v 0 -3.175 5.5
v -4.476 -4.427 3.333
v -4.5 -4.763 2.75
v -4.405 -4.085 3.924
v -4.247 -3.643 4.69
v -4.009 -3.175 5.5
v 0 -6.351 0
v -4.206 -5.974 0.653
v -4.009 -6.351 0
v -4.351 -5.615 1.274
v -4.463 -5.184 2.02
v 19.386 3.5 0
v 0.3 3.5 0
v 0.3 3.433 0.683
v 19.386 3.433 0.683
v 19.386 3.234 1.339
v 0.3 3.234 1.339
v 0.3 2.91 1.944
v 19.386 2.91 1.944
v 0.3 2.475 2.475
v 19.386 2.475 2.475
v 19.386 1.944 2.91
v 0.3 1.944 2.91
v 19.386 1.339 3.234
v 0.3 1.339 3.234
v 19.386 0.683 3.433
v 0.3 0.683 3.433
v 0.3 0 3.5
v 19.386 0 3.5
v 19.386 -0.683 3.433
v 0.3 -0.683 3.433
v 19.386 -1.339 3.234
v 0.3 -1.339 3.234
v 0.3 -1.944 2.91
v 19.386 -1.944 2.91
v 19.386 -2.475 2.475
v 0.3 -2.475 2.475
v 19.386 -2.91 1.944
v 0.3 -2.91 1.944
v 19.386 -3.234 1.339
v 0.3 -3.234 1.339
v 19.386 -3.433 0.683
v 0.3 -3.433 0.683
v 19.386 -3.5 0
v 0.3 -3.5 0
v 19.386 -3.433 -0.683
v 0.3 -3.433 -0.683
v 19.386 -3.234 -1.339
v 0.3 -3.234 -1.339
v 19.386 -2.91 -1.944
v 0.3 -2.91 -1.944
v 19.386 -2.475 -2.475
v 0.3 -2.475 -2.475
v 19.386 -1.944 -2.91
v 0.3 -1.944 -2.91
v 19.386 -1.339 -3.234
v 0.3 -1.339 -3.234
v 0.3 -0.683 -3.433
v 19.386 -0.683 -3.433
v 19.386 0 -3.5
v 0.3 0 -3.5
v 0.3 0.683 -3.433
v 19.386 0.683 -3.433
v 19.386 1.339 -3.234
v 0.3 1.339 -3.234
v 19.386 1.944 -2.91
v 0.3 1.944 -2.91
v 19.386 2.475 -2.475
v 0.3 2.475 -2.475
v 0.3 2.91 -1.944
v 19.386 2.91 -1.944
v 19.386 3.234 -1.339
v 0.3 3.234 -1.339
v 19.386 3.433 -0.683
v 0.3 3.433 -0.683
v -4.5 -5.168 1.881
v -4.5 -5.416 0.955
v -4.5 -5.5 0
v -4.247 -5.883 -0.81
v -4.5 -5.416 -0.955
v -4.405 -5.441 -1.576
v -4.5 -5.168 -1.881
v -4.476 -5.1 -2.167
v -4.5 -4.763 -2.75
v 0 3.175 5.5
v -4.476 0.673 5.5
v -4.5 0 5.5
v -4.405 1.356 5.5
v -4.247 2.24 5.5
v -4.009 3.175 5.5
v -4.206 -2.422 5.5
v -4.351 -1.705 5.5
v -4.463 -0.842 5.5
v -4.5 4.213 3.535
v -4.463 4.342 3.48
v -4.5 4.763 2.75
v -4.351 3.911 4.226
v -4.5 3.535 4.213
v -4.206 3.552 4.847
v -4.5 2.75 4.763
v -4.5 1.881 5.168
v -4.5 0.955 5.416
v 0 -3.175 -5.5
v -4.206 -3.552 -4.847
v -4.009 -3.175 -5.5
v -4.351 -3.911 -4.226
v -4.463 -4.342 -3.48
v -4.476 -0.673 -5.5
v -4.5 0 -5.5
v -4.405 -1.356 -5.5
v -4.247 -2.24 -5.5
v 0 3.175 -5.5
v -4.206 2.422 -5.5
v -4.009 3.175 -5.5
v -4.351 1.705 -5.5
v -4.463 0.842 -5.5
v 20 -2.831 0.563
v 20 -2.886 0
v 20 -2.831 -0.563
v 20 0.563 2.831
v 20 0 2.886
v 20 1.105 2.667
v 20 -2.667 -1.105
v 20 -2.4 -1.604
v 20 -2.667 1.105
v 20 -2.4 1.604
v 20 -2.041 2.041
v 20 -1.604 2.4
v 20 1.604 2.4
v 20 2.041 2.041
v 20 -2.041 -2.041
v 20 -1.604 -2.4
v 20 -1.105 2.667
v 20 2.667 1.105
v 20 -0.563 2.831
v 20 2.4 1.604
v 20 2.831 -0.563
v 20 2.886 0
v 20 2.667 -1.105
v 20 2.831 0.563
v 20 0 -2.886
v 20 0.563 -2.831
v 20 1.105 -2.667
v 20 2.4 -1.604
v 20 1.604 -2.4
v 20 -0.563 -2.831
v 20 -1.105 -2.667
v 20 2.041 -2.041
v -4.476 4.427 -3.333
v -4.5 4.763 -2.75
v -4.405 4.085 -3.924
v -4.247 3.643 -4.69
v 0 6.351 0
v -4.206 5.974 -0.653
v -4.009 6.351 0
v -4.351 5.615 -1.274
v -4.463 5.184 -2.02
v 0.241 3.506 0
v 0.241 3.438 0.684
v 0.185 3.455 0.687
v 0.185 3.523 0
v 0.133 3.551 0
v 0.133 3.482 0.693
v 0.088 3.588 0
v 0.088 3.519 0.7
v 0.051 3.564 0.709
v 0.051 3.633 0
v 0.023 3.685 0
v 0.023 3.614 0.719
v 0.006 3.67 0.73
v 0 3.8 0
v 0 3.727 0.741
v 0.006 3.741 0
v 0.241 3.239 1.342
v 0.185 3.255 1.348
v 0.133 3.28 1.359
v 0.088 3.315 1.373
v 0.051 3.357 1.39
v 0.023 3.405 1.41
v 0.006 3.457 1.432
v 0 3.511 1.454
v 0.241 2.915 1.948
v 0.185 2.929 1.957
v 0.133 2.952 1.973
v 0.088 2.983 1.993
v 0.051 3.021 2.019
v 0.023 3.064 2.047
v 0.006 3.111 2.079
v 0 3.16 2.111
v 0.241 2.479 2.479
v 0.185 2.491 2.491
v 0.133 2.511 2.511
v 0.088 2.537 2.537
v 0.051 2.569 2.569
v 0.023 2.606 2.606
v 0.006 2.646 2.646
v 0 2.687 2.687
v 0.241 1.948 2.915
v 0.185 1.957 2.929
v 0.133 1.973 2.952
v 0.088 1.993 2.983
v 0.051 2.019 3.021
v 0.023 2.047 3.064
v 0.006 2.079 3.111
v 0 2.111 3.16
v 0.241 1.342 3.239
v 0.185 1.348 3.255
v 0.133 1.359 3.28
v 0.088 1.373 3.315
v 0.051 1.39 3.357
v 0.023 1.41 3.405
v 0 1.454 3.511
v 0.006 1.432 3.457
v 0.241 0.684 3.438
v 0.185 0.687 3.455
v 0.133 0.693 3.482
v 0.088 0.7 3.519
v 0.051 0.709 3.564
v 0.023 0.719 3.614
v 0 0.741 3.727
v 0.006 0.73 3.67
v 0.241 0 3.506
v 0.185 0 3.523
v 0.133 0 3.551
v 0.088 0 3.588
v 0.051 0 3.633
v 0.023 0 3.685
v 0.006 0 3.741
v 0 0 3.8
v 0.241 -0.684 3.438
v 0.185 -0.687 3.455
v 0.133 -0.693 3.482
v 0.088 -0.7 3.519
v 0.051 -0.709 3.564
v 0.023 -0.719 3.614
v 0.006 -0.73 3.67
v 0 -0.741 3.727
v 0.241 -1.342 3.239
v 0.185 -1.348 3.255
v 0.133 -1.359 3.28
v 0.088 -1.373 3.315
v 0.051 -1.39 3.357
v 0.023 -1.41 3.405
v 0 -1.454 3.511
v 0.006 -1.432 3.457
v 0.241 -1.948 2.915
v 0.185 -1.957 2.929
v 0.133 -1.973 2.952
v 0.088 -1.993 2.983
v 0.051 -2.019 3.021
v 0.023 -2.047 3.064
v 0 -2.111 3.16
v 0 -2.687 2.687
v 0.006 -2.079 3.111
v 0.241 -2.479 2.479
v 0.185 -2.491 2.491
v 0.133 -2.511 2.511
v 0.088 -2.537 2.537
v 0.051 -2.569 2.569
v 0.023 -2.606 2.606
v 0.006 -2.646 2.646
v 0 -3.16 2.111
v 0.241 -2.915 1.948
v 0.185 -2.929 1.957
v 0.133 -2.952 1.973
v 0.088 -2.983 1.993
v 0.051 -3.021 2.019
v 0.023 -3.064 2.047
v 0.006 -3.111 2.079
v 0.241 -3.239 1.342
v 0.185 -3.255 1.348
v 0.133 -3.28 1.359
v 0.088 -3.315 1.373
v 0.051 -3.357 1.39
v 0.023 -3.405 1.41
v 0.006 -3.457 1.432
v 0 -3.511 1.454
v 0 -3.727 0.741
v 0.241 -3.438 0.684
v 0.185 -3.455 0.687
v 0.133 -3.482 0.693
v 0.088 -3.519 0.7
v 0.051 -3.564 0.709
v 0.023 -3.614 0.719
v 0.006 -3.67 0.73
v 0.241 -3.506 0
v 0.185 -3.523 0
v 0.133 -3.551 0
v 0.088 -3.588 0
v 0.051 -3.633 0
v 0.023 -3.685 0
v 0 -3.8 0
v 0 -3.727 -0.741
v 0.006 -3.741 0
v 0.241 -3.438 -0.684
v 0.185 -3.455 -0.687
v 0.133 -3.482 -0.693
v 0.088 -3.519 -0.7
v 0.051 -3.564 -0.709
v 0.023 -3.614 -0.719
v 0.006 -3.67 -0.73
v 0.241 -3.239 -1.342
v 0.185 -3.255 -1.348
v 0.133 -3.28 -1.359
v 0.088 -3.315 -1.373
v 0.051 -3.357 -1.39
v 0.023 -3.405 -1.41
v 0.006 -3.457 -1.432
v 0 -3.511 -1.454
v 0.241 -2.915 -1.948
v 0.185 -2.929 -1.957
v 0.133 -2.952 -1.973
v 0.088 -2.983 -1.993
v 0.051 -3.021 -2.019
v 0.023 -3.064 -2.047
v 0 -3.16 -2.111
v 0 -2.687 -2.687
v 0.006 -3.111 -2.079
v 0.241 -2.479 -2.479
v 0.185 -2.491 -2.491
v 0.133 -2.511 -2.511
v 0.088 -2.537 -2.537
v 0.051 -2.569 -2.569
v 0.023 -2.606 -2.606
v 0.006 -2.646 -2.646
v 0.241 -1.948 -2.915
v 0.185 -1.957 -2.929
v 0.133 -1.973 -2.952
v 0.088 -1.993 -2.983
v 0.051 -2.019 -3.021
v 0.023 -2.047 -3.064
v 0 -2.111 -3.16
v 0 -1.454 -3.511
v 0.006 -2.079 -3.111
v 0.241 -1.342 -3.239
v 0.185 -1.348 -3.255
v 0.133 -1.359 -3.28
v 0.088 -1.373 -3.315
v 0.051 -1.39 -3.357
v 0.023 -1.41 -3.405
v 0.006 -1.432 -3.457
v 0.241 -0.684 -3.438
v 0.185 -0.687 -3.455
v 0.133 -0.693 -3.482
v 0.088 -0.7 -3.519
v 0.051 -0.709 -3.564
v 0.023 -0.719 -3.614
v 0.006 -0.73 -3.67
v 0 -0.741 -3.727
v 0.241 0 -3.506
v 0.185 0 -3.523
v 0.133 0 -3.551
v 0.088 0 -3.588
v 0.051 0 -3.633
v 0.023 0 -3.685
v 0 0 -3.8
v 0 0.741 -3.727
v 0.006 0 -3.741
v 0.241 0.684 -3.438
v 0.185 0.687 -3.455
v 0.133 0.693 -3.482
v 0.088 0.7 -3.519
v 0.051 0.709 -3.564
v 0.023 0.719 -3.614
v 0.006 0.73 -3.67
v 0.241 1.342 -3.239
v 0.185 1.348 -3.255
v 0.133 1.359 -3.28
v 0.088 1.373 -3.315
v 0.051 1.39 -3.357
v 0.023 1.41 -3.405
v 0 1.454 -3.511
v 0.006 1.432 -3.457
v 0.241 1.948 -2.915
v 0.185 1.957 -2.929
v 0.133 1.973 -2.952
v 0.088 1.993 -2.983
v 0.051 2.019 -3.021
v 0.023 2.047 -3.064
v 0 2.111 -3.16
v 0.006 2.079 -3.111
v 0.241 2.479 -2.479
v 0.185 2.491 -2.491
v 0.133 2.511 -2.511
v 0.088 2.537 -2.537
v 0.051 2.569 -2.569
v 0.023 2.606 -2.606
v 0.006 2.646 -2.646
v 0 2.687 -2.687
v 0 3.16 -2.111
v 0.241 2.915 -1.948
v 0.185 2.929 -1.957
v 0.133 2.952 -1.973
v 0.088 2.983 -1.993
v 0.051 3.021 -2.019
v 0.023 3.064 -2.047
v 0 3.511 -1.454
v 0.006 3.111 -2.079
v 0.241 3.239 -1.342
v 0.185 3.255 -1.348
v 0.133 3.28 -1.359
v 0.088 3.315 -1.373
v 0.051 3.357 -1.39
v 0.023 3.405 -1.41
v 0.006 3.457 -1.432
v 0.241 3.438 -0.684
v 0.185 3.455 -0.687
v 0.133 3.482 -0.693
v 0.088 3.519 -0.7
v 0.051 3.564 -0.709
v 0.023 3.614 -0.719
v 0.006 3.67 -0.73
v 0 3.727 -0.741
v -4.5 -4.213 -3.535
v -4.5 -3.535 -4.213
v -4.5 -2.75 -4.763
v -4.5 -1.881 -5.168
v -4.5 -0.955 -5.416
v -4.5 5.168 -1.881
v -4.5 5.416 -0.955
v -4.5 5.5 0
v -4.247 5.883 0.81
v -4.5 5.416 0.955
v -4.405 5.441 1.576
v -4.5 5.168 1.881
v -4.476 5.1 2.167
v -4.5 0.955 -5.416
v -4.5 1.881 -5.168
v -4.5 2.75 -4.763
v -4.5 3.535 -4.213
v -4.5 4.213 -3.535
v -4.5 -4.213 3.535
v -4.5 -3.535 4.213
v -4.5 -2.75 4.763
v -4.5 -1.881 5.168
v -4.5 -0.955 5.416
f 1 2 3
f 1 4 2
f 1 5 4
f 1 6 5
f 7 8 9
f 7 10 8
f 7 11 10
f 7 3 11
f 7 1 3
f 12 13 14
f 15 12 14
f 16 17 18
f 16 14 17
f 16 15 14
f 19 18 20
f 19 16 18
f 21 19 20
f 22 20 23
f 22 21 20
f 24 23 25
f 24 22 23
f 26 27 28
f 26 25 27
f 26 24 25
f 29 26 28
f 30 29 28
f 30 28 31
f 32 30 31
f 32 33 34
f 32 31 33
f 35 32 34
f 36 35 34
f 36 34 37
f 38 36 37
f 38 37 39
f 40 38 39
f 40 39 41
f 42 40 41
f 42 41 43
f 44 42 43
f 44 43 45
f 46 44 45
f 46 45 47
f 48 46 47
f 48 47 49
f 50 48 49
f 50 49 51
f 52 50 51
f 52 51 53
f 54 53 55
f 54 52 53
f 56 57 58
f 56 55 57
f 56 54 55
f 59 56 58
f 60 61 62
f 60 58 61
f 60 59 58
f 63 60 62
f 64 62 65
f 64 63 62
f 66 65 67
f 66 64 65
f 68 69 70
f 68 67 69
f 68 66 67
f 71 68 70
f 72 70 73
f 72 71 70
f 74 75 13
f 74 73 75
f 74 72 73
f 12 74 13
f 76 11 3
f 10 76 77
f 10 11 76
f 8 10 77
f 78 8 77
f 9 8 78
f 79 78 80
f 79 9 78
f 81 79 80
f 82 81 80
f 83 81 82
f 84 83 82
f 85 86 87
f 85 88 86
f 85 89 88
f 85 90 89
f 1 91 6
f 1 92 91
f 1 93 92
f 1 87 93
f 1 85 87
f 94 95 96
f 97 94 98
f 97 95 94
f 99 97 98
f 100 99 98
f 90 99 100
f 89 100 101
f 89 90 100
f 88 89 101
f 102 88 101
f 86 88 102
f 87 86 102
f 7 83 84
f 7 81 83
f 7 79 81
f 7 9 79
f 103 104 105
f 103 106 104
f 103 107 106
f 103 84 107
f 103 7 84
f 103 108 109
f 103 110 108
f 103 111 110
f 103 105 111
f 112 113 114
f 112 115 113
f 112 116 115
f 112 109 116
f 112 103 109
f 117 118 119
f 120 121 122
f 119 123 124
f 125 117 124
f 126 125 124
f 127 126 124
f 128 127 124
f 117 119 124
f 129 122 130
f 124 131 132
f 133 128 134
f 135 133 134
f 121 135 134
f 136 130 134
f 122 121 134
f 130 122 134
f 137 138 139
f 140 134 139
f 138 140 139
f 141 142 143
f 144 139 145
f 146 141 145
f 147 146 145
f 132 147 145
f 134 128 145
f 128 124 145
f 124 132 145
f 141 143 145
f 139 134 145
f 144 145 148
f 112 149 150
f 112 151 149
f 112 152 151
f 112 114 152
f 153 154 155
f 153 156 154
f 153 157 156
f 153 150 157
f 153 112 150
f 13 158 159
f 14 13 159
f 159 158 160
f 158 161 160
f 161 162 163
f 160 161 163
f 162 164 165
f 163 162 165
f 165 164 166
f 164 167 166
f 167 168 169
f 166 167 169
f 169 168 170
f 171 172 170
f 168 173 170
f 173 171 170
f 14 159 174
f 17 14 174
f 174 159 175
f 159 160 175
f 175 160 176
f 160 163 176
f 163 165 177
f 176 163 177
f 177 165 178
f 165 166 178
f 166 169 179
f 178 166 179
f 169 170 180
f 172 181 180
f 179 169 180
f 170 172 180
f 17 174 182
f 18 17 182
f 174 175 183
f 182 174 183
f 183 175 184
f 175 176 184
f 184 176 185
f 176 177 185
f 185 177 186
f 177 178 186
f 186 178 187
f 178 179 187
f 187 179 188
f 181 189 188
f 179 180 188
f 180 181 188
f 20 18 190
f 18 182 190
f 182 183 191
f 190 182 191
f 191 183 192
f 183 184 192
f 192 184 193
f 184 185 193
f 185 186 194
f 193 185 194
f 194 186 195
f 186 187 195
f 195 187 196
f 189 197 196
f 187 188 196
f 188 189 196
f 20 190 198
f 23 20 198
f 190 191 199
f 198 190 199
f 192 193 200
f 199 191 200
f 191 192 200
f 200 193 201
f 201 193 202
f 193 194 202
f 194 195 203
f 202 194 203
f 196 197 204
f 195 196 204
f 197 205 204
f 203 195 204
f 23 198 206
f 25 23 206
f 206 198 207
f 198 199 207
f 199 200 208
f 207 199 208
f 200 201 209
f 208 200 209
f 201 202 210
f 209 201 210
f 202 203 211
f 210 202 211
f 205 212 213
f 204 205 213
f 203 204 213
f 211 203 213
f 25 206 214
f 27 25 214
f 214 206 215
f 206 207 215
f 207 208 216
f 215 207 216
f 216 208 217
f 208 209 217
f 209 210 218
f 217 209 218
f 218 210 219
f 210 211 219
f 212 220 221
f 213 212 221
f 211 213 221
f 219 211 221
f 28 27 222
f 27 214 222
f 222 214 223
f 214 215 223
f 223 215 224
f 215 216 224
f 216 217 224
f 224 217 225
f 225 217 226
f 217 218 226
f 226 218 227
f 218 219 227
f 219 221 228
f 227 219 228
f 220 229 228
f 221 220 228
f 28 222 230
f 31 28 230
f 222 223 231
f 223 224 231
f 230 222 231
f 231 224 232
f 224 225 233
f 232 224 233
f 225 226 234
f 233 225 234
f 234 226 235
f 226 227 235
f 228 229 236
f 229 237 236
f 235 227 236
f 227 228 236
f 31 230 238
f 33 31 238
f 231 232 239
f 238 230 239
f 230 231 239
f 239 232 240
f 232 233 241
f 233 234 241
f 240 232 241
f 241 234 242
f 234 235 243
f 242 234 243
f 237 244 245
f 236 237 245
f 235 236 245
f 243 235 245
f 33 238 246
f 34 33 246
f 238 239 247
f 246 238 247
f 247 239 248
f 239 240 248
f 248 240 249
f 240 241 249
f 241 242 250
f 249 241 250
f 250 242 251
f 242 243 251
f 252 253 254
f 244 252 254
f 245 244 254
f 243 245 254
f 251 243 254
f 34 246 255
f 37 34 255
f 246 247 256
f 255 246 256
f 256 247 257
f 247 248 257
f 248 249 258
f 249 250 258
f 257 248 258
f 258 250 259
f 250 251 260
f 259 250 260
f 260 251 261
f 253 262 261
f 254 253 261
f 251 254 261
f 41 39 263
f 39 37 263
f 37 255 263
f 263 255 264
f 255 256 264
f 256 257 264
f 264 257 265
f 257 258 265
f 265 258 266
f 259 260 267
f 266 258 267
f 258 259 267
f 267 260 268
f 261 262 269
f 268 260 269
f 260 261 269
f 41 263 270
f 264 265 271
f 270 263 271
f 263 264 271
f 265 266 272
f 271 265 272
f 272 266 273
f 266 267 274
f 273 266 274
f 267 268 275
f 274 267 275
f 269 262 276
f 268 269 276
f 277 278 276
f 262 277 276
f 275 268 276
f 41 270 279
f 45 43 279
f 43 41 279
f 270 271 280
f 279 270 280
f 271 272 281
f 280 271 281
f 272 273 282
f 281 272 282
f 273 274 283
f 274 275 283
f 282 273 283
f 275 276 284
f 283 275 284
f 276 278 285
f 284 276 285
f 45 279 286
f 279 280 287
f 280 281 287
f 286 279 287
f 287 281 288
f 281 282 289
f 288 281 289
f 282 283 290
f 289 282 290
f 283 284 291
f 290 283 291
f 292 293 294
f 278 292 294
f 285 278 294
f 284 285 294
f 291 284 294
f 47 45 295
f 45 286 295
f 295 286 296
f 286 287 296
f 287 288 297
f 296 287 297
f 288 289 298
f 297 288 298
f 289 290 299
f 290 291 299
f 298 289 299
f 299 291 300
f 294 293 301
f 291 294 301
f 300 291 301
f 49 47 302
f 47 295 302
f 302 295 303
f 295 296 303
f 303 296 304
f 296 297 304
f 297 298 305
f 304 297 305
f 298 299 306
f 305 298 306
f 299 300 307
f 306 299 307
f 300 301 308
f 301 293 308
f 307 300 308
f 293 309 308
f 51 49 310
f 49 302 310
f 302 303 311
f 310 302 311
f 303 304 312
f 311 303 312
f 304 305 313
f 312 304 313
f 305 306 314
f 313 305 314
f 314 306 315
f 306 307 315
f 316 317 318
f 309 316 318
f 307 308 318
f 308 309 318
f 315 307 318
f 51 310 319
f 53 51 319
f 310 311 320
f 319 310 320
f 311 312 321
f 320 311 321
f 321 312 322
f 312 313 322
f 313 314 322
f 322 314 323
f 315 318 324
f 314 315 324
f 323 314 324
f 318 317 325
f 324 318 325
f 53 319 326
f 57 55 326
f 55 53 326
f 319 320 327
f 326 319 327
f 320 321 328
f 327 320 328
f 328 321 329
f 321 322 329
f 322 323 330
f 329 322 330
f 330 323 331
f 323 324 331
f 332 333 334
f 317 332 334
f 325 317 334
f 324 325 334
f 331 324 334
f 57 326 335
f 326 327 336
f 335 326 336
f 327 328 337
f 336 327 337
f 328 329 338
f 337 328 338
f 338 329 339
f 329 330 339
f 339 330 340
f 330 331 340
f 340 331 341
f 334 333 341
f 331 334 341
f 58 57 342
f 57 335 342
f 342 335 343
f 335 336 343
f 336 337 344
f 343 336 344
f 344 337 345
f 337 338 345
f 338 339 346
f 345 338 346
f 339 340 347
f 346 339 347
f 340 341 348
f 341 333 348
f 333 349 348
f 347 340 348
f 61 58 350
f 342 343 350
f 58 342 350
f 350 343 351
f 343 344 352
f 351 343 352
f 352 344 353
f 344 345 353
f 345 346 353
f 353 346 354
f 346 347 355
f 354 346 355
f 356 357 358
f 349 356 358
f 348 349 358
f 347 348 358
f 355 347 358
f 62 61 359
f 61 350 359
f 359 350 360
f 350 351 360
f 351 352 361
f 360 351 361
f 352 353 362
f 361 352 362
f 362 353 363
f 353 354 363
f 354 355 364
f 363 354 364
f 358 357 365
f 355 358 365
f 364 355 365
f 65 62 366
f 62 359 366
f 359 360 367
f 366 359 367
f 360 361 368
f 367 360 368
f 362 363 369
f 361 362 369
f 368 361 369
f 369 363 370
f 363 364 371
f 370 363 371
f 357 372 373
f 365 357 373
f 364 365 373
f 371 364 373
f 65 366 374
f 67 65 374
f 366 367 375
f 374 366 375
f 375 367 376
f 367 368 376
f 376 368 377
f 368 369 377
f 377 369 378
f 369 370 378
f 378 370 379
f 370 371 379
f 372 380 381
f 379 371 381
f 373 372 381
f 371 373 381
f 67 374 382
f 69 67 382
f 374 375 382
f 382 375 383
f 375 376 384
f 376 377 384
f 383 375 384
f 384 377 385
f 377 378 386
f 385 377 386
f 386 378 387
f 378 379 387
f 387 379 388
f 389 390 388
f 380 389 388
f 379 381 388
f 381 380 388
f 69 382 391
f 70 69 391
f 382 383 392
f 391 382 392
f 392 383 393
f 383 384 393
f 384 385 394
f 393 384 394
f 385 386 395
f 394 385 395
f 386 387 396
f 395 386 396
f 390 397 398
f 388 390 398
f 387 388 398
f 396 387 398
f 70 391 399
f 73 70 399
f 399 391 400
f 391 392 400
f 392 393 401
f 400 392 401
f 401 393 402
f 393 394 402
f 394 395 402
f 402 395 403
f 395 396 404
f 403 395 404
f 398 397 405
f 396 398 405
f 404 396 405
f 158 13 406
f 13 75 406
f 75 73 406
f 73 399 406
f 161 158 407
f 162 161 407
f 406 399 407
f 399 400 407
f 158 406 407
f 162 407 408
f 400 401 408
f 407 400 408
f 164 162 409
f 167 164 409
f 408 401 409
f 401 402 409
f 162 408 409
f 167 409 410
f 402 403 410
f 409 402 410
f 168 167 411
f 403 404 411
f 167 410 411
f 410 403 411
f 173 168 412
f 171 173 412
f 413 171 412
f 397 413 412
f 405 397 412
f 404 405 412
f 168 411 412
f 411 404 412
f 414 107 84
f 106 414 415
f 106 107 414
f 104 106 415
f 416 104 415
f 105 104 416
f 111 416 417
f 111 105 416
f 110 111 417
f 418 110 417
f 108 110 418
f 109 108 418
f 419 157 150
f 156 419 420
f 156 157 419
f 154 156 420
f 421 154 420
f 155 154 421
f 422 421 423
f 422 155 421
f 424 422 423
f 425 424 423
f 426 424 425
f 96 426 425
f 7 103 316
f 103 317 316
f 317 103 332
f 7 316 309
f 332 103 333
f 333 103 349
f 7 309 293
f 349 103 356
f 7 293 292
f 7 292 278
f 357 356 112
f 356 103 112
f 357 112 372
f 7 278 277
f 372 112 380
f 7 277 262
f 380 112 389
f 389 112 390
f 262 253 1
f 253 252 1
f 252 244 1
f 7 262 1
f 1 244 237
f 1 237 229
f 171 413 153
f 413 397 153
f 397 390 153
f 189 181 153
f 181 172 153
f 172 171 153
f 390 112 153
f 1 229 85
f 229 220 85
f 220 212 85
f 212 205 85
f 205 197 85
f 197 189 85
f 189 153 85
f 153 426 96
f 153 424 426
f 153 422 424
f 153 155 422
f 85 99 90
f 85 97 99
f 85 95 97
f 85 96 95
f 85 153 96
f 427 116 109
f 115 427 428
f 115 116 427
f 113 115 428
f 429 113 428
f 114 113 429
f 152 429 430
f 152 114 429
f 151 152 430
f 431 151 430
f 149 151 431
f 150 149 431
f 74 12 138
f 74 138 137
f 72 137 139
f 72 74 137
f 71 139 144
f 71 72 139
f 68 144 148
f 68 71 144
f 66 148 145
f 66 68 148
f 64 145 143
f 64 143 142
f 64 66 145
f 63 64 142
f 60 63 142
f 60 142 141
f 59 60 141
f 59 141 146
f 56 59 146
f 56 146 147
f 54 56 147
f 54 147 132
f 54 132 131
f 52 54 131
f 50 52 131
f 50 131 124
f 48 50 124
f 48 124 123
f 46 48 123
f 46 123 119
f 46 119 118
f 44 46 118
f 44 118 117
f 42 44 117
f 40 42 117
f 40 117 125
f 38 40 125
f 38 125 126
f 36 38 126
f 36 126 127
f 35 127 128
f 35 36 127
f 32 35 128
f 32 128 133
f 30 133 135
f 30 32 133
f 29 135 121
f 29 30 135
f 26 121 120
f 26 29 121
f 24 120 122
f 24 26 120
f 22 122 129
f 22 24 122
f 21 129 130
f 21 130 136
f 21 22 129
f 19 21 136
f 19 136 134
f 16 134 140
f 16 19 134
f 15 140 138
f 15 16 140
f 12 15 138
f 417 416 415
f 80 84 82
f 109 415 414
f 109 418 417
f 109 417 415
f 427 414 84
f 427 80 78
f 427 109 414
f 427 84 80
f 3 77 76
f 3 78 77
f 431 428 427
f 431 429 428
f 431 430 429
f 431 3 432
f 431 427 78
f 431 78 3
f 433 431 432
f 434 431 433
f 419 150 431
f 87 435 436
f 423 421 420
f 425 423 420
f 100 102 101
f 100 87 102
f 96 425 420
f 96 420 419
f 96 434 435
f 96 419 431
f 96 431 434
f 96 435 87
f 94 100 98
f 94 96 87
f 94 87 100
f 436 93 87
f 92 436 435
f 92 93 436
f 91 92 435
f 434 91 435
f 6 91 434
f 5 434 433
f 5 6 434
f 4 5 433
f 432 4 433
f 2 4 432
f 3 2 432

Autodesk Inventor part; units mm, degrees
ref_plane "YZ Plane" through (0, 0, 0) normal (1, 0, 0) x (0, 1, 0)
ref_plane "XZ Plane" through (0, 0, 0) normal (0, 1, 0) x (-1, 0, 0)
sketch "Sketch1" plane through (0, 0, 0) normal (0, 0, 1) x (1, 0, 0)
  line L0 (0, 3.5) -> (20, 3.5)
  line L1 (20, 3.5) -> (20, 0)
  line L2 (20, 0) -> (0, 0)
  line L3 (-4, 0) -> (24, 0) projected
  line L4 (0, -0.7) -> (0, 4.2) projected
  line L5 (0, 3.5) -> (0, 0)
  dimension "d2" = 7
  dimension "d59" = 20
revolve "Body" add sketch "Sketch1" angle 360 about axis through (20, 0, 0) along (-1, 0, 0)
sketch "Sketch2" plane through (0, 0, 0) normal (-1, 0, 0) x (0, 0, 1)
  line L0 (0, 6.3509) -> (5.5, 3.1754)
  line L1 (5.5, 3.1754) -> (5.5, -3.1754)
  line L2 (5.5, -3.1754) -> (0, -6.3509)
  line L3 (0, -6.3509) -> (-5.5, -3.1754)
  line L4 (-5.5, -3.1754) -> (-5.5, 3.1754)
  line L5 (-5.5, 3.1754) -> (0, 6.3509)
  line L6 (-7.7, 0) -> (7.7, 0) projected
  line L7 (0, 8.8912) -> (0, -8.8912) projected
  point P0 (0, 0)
  point P1 (0, 0)
  dimension "d11" = 11
extrude "Head" add sketch "Sketch2" along normal blind 4.5
sketch "Sketch4" plane through (0, 0, 0) normal (0, 0, 1) x (1, 0, 0)
  line L0 (-3.8649, 6.6) -> (-4.5, 5.5)
  line L1 (-1.1, 0) -> (-0.234, 0)
  line L2 (-5.3532, 0) -> (0.6192, 0) projected
  line L3 (-4.5, 6.6) -> (-3.8649, 6.6)
  line L4 (-4.5, 5.5) -> (-4.5, 6.6)
  line L5 (0, 7.92) -> (0, -1.32) projected
  dimension "d65" = 11
  dimension "d67" = 30
  dimension "d68" = 13.2
  dimension "d69" = 4.5
revolve "Chamfer1" cut sketch "Sketch4" angle 360 about axis through (-1.1, 0, 0) along (1, 0, 0)
thread "Thread" size "M7x1" class "6g" standard "ISO Metric profile" length 13
chamfer "Chamfer2" distance 0.6135 distance2 0.6136 1 edges at (20, -3.5, 0) measured on face at (20, 0.2032, -0.9043)
fillet "Fillet2" radius 0.3 1 edges at (0, -3.5, 0)
ref_plane "Work Plane1" through (1.525, 0, 0) normal (0, 0, 1) x (1, 0, 0)
equation "\"d2\" = GD"
equation "\"d59\" = NLG"
equation "\"d11\" = SW"
equation "\"d3\" = KOH"
equation "\"d71\" = RR"
equation "\"d15\" = GEL"
equation "\"d6\" = -0.5 * SPD + 0.5 * GD"
equation "\"d65\" = SW"
equation "\"d67\" = ANG1"
equation "\"d68\" = 1.2 * SW"
equation "\"d69\" = KOH"
equation "\"NLG\" = 20"
equation "\"GD\" = NND"
equation "\"BDM\" = NND"
equation "\"KOH\" = 4.5"
equation "\"GEL\" = 13"
equation "\"SW\" = 11"
equation "\"SW0\" = 11"
equation "\"SPD\" = NND - 1.2269 * PTC"
equation "\"SD2\" = NND"
equation "\"SD\" = 0"
equation "\"ANG1\" = 30deg"
equation "\"GAL\" = 0.61345 * PTC"
equation "\"GUL\" = 0.61345 * PTC"
equation "\"RR\" = 0.3"
equation "\"RR1\" = 0.1"
equation "\"GD1\" = THREADDIA - 1.2269 * PTC"
equation "\"THREADDIA\" = 7"
equation "\"TOA\" = 30deg"
equation "\"FAWI\" = 60deg"
equation "\"PTC\" = 1"
equation "\"NND\" = 7"
equation "\"E0\" = 1.155 * SW"
properties part number "CSN 02 1201 - M7 x 20" material "Steel, Mild"
